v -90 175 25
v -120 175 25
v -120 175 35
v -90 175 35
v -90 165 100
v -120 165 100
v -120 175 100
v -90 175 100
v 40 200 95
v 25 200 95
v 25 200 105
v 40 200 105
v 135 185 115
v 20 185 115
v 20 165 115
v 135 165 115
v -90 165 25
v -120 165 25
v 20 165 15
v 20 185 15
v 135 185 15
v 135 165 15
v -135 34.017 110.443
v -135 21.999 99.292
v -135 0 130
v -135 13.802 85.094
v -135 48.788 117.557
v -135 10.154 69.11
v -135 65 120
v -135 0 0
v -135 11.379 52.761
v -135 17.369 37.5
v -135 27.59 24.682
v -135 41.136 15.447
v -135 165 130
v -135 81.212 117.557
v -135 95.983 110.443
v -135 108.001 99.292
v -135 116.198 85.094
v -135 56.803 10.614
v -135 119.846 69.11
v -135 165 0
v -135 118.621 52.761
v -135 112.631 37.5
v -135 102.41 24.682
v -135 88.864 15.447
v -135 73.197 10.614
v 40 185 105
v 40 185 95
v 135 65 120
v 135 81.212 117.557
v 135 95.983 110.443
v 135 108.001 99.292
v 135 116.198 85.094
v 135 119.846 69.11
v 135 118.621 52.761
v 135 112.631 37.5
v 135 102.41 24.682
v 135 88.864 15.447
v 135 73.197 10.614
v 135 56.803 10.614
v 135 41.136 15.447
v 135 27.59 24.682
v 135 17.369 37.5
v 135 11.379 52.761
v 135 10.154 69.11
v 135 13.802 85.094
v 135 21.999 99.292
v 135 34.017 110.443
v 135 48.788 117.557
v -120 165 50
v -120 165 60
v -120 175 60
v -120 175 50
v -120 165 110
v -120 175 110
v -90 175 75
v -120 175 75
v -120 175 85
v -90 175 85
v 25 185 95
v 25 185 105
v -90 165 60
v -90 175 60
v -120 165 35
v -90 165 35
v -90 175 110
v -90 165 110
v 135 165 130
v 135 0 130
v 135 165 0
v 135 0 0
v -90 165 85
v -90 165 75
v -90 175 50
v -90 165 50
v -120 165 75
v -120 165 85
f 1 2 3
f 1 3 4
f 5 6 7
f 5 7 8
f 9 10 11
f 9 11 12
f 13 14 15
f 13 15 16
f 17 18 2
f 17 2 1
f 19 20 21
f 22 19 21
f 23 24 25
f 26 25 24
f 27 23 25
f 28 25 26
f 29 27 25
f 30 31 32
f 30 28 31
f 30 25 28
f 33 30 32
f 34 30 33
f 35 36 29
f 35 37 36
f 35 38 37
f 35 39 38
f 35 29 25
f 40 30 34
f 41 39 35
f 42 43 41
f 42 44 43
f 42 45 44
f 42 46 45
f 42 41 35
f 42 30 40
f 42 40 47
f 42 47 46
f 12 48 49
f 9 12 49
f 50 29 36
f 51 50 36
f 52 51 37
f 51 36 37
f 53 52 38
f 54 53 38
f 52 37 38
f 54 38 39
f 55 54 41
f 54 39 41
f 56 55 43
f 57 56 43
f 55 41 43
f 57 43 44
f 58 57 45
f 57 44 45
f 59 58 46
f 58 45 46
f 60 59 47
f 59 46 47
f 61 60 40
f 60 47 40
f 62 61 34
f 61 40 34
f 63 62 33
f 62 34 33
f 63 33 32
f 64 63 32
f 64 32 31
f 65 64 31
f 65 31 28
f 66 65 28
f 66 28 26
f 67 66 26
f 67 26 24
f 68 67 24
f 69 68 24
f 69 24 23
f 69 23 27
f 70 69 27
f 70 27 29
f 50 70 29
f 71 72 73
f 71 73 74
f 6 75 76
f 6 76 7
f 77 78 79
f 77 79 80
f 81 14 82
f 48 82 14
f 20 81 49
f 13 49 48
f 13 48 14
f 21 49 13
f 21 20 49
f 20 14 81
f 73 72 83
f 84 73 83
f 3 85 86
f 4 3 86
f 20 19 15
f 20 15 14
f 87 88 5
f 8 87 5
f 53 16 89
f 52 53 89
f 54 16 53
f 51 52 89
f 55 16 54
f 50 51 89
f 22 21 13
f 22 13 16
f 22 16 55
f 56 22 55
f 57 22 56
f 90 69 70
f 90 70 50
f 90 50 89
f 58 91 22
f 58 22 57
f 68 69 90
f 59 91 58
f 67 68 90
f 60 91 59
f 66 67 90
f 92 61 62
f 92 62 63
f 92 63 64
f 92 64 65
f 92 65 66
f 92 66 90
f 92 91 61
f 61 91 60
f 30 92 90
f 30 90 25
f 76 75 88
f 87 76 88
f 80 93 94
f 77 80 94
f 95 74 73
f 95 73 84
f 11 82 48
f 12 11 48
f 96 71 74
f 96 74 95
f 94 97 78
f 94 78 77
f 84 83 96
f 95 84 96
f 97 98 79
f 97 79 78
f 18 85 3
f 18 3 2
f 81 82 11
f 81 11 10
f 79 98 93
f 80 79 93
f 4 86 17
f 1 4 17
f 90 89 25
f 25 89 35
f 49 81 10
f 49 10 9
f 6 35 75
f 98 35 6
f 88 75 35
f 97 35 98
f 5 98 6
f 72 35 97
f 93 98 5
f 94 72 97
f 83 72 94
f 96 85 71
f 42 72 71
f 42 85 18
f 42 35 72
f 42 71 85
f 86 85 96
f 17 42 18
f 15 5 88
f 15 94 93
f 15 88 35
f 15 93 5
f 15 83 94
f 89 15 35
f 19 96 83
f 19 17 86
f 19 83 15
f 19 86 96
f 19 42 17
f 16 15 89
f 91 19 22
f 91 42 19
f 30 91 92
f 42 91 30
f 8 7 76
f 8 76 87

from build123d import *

# Parameters (mm, degrees)
DODANIE_WYCI_GNI_CIE1_DEPTH = 130
SZKIC2_W                    = 115
SZKIC2_H                    = 15
WYTNIJ_WYCI_GNI_CIE1_DEPTH  = 20
SZKIC3_W                    = 30
SZKIC3_H                    = 10
DODANIE_WYCI_GNI_CIE2_DEPTH = 10
SZKIC4_W                    = 15
SZKIC4_H                    = 10
DODANIE_WYCI_GNI_CIE3_DEPTH = 15
SZKIC5_R                    = 55
WYTNIJ_WYCI_GNI_CIE2_DEPTH  = 361.277670693


with BuildPart() as part:
    # Szkic1 → Dodanie-wyciągnięcie1 (new body)
    with BuildSketch(Plane.XY):
        Polygon((135, 0), (-135, 0), (-135, 165), (20, 165), (20, 185), (135, 185), align=None)
    extrude(amount=DODANIE_WYCI_GNI_CIE1_DEPTH)

    # Szkic2 → Wytnij-wyciągnięcie1 (cut)
    with BuildSketch(Plane(origin=(0, 185, 0), x_dir=(1, 0, 0), z_dir=(0, 1, 0))):
        with Locations((77.5, -122.5)):
            Rectangle(SZKIC2_W, SZKIC2_H)
        with Locations((77.5, -7.5)):
            Rectangle(SZKIC2_W, SZKIC2_H)
    extrude(amount=-WYTNIJ_WYCI_GNI_CIE1_DEPTH, mode=Mode.SUBTRACT)

    # Szkic3 → Dodanie-wyciągnięcie2 (add)
    with BuildSketch(Plane(origin=(0, 165, 0), x_dir=(1, 0, 0), z_dir=(0, 1, 0))):
        with Locations((-105, -105)):
            Rectangle(SZKIC3_W, SZKIC3_H)
        with Locations((-105, -80)):
            Rectangle(SZKIC3_W, SZKIC3_H)
        with Locations((-105, -55)):
            Rectangle(SZKIC3_W, SZKIC3_H)
        with Locations((-105, -30)):
            Rectangle(SZKIC3_W, SZKIC3_H)
    extrude(amount=DODANIE_WYCI_GNI_CIE2_DEPTH)

    # Szkic4 → Dodanie-wyciągnięcie3 (add)
    with BuildSketch(Plane(origin=(0, 185, 0), x_dir=(1, 0, 0), z_dir=(0, 1, 0))):
        with Locations((32.5, -100)):
            Rectangle(SZKIC4_W, SZKIC4_H)
    extrude(amount=DODANIE_WYCI_GNI_CIE3_DEPTH)

    # Szkic5 → Wytnij-wyciągnięcie2 (cut, through all)
    with BuildSketch(Plane.ZY.offset(135)):
        with Locations((65, 65)):
            Circle(SZKIC5_R)
    extrude(amount=-WYTNIJ_WYCI_GNI_CIE2_DEPTH, mode=Mode.SUBTRACT)


solid = part.part
